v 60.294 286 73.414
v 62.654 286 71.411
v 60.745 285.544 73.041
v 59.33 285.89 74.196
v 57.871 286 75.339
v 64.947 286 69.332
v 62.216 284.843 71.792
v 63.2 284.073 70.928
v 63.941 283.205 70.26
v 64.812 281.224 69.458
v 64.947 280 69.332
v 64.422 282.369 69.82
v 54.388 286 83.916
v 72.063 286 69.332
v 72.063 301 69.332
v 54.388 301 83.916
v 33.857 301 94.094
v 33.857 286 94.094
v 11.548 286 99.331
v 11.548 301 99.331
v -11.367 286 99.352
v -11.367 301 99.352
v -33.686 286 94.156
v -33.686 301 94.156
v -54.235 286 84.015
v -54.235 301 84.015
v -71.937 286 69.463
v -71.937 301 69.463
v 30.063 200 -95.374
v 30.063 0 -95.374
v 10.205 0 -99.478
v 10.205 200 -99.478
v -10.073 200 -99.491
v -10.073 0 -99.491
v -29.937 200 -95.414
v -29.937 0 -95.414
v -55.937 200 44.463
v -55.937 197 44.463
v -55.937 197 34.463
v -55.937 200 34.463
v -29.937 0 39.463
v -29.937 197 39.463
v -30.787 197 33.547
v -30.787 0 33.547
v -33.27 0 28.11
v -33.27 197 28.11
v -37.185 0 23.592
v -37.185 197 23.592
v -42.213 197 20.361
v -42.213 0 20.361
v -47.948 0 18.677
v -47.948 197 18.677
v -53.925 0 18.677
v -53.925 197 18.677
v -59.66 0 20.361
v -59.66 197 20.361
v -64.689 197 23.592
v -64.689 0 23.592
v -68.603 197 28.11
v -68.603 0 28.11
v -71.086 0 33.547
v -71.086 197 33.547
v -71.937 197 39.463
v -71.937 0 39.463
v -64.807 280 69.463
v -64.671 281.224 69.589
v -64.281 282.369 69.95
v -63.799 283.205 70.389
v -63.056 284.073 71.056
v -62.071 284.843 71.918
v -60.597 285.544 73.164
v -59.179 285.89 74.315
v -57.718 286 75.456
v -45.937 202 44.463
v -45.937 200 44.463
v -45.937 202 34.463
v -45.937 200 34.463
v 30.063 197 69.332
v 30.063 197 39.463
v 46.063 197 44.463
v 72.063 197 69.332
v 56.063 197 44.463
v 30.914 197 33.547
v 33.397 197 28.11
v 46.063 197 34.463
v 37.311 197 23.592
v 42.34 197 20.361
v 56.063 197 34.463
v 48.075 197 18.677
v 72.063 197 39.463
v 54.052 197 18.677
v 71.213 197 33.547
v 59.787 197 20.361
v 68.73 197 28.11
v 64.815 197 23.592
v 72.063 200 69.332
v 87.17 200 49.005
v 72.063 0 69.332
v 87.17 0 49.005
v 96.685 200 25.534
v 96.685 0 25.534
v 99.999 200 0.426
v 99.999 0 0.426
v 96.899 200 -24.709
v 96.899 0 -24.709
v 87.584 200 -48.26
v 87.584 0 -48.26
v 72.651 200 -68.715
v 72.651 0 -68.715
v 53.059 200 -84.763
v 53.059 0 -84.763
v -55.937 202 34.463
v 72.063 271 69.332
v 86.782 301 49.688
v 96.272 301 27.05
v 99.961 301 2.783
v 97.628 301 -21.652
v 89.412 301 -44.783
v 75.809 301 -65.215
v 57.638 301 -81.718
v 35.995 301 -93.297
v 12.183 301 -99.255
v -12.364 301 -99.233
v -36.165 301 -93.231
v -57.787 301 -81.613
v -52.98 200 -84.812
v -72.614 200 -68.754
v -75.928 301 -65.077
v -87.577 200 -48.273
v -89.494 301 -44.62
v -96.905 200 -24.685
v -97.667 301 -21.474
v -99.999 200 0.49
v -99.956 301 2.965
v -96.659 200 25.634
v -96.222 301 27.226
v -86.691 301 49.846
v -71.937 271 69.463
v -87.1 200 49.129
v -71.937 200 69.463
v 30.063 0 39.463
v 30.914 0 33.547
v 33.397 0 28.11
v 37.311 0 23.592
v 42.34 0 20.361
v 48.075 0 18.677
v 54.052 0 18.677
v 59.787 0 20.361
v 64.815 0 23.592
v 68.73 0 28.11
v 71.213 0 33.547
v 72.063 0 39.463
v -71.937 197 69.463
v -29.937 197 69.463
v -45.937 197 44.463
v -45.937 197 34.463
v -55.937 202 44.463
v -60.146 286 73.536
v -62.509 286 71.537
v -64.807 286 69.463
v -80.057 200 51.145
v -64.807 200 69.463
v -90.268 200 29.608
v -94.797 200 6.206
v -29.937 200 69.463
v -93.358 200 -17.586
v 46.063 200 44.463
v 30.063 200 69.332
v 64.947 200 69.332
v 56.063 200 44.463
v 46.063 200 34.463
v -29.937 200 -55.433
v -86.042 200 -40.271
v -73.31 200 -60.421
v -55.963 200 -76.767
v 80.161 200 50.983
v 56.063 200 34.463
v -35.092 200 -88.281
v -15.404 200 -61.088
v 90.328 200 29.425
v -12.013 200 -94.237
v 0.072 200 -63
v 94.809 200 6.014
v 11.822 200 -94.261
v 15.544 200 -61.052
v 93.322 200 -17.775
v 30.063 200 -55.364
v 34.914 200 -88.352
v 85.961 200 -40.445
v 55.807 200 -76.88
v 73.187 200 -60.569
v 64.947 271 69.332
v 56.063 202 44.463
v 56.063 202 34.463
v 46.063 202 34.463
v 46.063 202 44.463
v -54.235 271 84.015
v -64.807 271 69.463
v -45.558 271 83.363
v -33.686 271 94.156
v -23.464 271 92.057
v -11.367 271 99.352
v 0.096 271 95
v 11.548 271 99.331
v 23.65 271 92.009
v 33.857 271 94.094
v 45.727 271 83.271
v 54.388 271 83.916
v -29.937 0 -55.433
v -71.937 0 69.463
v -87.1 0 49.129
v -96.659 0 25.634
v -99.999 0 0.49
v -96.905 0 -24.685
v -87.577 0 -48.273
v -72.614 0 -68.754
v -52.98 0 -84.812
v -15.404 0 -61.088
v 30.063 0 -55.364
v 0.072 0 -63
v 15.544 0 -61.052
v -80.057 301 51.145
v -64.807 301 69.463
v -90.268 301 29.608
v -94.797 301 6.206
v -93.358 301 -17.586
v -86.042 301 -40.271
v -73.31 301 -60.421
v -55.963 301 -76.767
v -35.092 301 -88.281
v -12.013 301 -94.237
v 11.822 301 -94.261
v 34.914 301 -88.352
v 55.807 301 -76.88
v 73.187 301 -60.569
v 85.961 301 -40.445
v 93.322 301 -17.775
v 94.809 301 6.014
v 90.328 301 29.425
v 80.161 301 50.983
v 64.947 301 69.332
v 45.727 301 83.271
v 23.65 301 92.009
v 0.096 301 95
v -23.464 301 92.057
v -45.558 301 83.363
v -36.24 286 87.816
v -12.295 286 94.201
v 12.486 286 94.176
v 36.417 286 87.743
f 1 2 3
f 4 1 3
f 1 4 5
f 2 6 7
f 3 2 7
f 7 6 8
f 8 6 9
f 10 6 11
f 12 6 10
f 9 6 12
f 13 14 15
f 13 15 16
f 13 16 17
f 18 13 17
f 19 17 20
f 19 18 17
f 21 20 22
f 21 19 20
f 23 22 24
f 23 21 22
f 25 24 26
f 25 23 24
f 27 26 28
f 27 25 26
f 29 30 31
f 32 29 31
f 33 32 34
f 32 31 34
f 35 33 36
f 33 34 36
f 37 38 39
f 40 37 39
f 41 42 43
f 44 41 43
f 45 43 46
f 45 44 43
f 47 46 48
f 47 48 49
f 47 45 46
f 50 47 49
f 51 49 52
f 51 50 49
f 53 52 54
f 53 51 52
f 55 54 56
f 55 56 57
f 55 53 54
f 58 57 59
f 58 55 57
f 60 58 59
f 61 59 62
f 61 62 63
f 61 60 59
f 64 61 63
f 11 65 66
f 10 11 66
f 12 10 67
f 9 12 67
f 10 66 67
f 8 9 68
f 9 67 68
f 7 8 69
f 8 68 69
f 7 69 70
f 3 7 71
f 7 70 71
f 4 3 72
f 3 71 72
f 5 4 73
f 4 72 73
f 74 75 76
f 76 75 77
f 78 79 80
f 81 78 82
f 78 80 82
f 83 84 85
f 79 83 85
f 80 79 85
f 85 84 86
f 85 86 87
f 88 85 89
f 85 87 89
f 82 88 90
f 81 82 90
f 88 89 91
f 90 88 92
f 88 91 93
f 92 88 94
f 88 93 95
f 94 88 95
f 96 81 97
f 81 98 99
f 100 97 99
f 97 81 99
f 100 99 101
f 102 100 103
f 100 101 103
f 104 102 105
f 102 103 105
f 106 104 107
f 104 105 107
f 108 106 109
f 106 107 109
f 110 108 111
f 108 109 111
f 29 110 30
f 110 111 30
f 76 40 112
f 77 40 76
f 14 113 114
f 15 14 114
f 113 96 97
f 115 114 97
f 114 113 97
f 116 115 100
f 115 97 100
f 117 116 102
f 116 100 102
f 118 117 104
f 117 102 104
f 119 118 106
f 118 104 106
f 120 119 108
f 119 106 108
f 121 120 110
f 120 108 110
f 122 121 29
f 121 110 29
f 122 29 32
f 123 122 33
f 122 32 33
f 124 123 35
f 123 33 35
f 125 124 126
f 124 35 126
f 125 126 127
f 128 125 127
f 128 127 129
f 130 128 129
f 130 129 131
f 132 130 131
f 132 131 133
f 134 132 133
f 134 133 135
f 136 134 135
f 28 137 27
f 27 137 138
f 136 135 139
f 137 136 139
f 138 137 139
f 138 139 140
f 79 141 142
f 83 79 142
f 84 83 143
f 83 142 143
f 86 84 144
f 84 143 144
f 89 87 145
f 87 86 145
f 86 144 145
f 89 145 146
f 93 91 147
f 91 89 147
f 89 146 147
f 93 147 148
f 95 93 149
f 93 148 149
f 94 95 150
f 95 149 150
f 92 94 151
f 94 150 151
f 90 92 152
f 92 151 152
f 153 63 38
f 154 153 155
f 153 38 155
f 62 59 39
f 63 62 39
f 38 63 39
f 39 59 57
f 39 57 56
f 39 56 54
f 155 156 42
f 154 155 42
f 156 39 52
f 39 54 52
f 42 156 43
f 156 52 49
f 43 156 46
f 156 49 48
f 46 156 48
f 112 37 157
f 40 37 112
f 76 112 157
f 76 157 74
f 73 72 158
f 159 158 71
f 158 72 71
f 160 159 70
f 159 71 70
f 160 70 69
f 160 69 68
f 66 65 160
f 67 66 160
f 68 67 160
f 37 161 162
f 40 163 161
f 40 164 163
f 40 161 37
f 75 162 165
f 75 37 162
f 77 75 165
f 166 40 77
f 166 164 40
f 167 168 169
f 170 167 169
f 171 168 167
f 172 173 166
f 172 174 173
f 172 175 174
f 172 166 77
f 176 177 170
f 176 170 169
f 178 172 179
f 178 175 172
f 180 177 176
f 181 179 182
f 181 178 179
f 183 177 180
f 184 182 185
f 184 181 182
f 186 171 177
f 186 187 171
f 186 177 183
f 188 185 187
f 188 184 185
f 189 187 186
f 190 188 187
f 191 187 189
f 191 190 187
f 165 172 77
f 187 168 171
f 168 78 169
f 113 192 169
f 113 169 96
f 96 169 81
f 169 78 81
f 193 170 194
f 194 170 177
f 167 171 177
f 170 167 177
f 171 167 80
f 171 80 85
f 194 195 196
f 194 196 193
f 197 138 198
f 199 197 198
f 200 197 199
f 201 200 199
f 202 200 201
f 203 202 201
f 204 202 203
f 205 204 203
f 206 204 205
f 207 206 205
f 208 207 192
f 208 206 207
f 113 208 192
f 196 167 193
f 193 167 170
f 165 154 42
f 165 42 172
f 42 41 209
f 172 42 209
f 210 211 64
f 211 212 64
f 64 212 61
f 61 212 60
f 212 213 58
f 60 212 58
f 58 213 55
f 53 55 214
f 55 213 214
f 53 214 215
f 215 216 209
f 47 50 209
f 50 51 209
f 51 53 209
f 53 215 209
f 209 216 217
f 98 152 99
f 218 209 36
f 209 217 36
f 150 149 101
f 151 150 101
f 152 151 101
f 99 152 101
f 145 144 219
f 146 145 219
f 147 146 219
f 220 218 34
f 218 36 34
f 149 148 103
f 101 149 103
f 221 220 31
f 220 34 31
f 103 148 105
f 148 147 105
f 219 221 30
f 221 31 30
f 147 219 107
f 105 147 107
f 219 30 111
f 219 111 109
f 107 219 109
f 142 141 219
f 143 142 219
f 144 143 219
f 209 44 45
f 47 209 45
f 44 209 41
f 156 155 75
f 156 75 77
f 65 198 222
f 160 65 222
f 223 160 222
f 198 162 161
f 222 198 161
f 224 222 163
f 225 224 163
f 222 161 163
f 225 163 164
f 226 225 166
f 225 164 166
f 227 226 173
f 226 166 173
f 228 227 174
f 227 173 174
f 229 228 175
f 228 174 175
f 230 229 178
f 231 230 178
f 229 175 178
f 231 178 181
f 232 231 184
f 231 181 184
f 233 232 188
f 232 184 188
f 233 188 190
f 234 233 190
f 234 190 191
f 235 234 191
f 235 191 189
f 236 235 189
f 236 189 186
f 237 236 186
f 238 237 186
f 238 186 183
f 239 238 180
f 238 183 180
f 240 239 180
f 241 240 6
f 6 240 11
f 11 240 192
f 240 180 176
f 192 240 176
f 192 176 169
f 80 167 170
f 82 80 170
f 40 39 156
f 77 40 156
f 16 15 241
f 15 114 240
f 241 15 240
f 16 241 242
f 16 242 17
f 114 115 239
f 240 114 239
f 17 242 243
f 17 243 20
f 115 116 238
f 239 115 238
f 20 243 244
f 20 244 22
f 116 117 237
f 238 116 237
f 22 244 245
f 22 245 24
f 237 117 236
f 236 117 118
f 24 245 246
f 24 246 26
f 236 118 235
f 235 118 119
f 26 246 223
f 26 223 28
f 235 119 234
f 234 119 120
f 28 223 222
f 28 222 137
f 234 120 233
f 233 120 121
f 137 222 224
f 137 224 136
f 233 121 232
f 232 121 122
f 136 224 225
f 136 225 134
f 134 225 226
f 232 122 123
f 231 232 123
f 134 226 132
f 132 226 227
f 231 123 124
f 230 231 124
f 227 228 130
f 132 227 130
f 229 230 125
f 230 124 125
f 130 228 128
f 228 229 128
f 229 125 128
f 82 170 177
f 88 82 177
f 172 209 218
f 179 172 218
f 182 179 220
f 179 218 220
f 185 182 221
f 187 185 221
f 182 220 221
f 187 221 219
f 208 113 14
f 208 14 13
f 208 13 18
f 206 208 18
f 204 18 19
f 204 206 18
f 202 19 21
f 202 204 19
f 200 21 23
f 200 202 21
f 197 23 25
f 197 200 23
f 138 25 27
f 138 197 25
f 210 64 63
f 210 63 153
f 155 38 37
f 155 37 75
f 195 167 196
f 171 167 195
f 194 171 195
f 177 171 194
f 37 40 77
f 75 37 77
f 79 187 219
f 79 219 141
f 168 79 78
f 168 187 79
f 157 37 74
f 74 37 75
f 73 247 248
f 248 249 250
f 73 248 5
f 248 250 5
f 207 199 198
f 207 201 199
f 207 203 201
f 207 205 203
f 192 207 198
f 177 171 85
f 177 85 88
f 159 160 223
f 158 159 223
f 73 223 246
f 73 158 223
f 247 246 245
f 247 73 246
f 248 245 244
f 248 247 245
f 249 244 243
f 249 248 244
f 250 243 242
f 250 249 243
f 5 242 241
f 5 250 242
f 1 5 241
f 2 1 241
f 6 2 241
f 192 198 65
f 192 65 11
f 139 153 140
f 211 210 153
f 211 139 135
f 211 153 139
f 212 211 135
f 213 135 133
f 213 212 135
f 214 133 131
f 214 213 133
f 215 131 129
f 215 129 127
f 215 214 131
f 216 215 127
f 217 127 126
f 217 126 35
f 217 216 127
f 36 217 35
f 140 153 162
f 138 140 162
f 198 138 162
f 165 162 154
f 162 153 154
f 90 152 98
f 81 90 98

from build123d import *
from build123d.topology import SkipClean

# Parameters (mm, degrees)
BOSS_EXTRUDE2_DEPTH   = 200
BOSS_EXTRUDE2_2_DEPTH = 200
BOSS_EXTRUDE3_START   = -3
SKETCH3_W             = 10
SKETCH3_H             = 10
BOSS_EXTRUDE3_DEPTH   = 3
SKETCH4_W             = 10
SKETCH4_H             = 10
BOSS_EXTRUDE4_DEPTH   = 3
SKETCH5_W             = 10
SKETCH5_H             = 10
BOSS_EXTRUDE5_DEPTH   = 2
BOSS_EXTRUDE5_2_DEPTH = 2
BOSS_EXTRUDE6_START   = -200
BOSS_EXTRUDE6_DEPTH   = 200
BOSS_EXTRUDE7_DEPTH   = 101
BOSS_EXTRUDE8_START   = -15
BOSS_EXTRUDE8_DEPTH   = 15
BOSS_EXTRUDE9_START   = 15
BOSS_EXTRUDE9_DEPTH   = 15
FILLET2_R             = 6


with BuildPart() as part:
    # Sketch2 → Boss-Extrude2 (new body)
    with BuildSketch(Plane(origin=(0, 0, 0), x_dir=(1, 0, 0), z_dir=(0, 1, 0))):
        with BuildLine():
            Line((-29.936750537, 95.41378814), (-29.936750537, -39.462967992))
            ThreePointArc((-29.936750537, -39.462967992), (-50.936750537, -18.462967992), (-71.936750537, -39.462967992))
            Line((-71.936750537, -39.462967992), (-71.936750537, -69.462967992))
            ThreePointArc((-71.936750537, -69.462967992), (-96.905308077, 24.685243904), (-29.936750537, 95.41378814))
        make_face()
    extrude(amount=BOSS_EXTRUDE2_DEPTH)

    # Sketch3 → Boss-Extrude3 (add)
    with BuildSketch(Plane(origin=(0, 200, 0), x_dir=(1, 0, 0), z_dir=(0, 1, 0)).offset(BOSS_EXTRUDE3_START)):
        with BuildLine():
            Line((-71.936750537, -69.462967992), (-29.936750537, -69.462967992))
            Line((-29.936750537, -69.462967992), (-29.936750537, -39.462967992))
            ThreePointArc((-29.936750537, -39.462967992), (-50.936750537, -18.462967992), (-71.936750537, -39.462967992))
            Line((-71.936750537, -39.462967992), (-71.936750537, -69.462967992))
        make_face()
        with Locations((-50.936750537, -39.462967992)):
            Rectangle(SKETCH3_W, SKETCH3_H, mode=Mode.SUBTRACT)
    extrude(amount=BOSS_EXTRUDE3_DEPTH)



with BuildPart() as body_2:
    # Sketch2 → Boss-Extrude2 2 (new body)
    with BuildSketch(Plane(origin=(0, 0, 0), x_dir=(1, 0, 0), z_dir=(0, 1, 0))):
        with BuildLine():
            ThreePointArc((72.063249463, -69.331724894), (96.899173876, 24.709312052), (30.063249463, 95.374006059))
            Line((30.063249463, 95.374006059), (30.063249463, -39.462967992))
            ThreePointArc((30.063249463, -39.462967992), (51.063249463, -18.462967992), (72.063249463, -39.462967992))
            Line((72.063249463, -39.462967992), (72.063249463, -69.331724894))
        make_face()
    extrude(amount=BOSS_EXTRUDE2_2_DEPTH)

    # Sketch4 → Boss-Extrude4 (add)
    with BuildSketch(Plane(origin=(0, 200, 0), x_dir=(1, 0, 0), z_dir=(0, 1, 0))):
        with BuildLine():
            Line((30.063249463, -39.462967992), (30.063249463, -69.331724894))
            Line((30.063249463, -69.331724894), (72.063249463, -69.331724894))
            Line((72.063249463, -69.331724894), (72.063249463, -39.462967992))
            ThreePointArc((72.063249463, -39.462967992), (51.063249463, -18.462967992), (30.063249463, -39.462967992))
        make_face()
        with Locations((51.063249463, -39.462967992)):
            Rectangle(SKETCH4_W, SKETCH4_H, mode=Mode.SUBTRACT)
    extrude(amount=-BOSS_EXTRUDE4_DEPTH)


with BuildPart() as body_3:
    # Sketch5 → Boss-Extrude5 (new body)
    with BuildSketch(Plane(origin=(0, 200, 0), x_dir=(1, 0, 0), z_dir=(0, 1, 0))):
        with Locations((51.063249463, -39.462967992)):
            Rectangle(SKETCH5_W, SKETCH5_H)
    extrude(amount=BOSS_EXTRUDE5_DEPTH)


with BuildPart() as body_4:
    # Sketch5 → Boss-Extrude5 2 (new body)
    with BuildSketch(Plane(origin=(0, 200, 0), x_dir=(1, 0, 0), z_dir=(0, 1, 0))):
        with Locations((-50.936750537, -39.462967992)):
            Rectangle(SKETCH5_W, SKETCH5_H)
    extrude(amount=BOSS_EXTRUDE5_2_DEPTH)


with BuildPart() as part_1:
    add(part.part)

    add(body_2.part)  # Boss-Extrude6 merges body 2
    # Sketch7 → Boss-Extrude6 (add)
    with BuildSketch(Plane(origin=(0, 200, 0), x_dir=(1, 0, 0), z_dir=(0, 1, 0)).offset(BOSS_EXTRUDE6_START)):
        with BuildLine():
            Line((-29.936750537, 95.41378814), (-29.936750537, 55.432760777))
            ThreePointArc((-29.936750537, 55.432760777), (0.071928174, 62.999958939), (30.063249463, 55.364257709))
            Line((30.063249463, 55.364257709), (30.063249463, 95.374006059))
            ThreePointArc((30.063249463, 95.374006059), (0.066303455, 99.999978019), (-29.936750537, 95.41378814))
        make_face()
    extrude(amount=BOSS_EXTRUDE6_DEPTH)

    # Sketch8 → Boss-Extrude7 (add)
    with SkipClean():  # the faces are left unmerged after this step: merging them gives an invalid solid
        with BuildSketch(Plane(origin=(0, 200, 0), x_dir=(1, 0, 0), z_dir=(0, 1, 0))):
            with BuildLine():
                Line((-71.936750537, -69.462967992), (-64.806605202, -69.462967992))
                ThreePointArc((-64.806605202, -69.462967992), (-0.096090498, 94.999951403), (64.946993181, -69.331724894))
                Line((64.946993181, -69.331724894), (72.063249463, -69.331724894))
                ThreePointArc((72.063249463, -69.331724894), (-0.091141002, 99.999958467), (-71.936750537, -69.462967992))
            make_face()
        extrude(amount=BOSS_EXTRUDE7_DEPTH)
    add(part_1.part.scale(1), mode=Mode.REPLACE)  # the faces are merged on a copy

    # Sketch10 → Boss-Extrude8 (add)
    with BuildSketch(Plane(origin=(0, 301, 0), x_dir=(1, 0, 0), z_dir=(0, 1, 0)).offset(BOSS_EXTRUDE8_START)):
        with BuildLine():
            Line((-71.936750537, -69.462967992), (-64.806605202, -69.462967992))
            ThreePointArc((-64.806605202, -69.462967992), (0.096090498, -94.999951403), (64.946993181, -69.331724894))
            Line((64.946993181, -69.331724894), (72.063249463, -69.331724894))
            ThreePointArc((72.063249463, -69.331724894), (0.091141002, -99.999958467), (-71.936750537, -69.462967992))
        make_face()
    extrude(amount=BOSS_EXTRUDE8_DEPTH)

    # Sketch11 → Boss-Extrude9 (add)
    with SkipClean():  # the faces are left unmerged after this step: merging them gives an invalid solid
        with BuildSketch(Plane.XZ.offset(-286).offset(BOSS_EXTRUDE9_START)):
            with BuildLine():
                ThreePointArc((72.063249463, 69.331724894), (0.091141002, 99.999958467), (-71.936750537, 69.462967992))
                Line((-71.936750537, 69.462967992), (-64.806605202, 69.462967992))
                ThreePointArc((-64.806605202, 69.462967992), (0.096090498, 94.999951403), (64.946993181, 69.331724894))
                Line((64.946993181, 69.331724894), (72.063249463, 69.331724894))
            make_face()
            with BuildLine():
                Line((-64.806605202, 69.462967992), (64.946993181, 69.331724894))
                ThreePointArc((64.946993181, 69.331724894), (0.096090498, 94.999951403), (-64.806605202, 69.462967992))
            make_face()
        extrude(amount=-BOSS_EXTRUDE9_DEPTH)
    add(part_1.part.scale(1), mode=Mode.REPLACE)  # the faces are merged on a copy

    # Fillet2
    # the kernel refuses this fillet: 6 mm, written as the material it takes off along each edge
    with BuildSketch(Plane(origin=(-79.806597528, 286, 69.478140176), x_dir=(0, -1, 0), z_dir=(0.9999994884550568, 0, -0.0010114789294520309))) as fillet2_piece_1_section:
        with BuildLine():
            CenterArc((FILLET2_R, -FILLET2_R), FILLET2_R, 90, 90)
            Line((0, -FILLET2_R), (0, 0))
            Line((0, 0), (FILLET2_R, 0))
        make_face()
    fillet2_piece_1 = extrude(amount=159.753664757, mode=Mode.PRIVATE)
    fillet2_piece_1 = fillet2_piece_1 & Plane(origin=(0, 284.623966258, 0), x_dir=(-0.6821747915961063, 0, 0.7311891367565639), z_dir=(0, -1, 0)) * Cylinder(95, 344, mode=Mode.PRIVATE)
    add(fillet2_piece_1, mode=Mode.SUBTRACT)


solid = Compound([body_3.part, body_4.part, part_1.part])
